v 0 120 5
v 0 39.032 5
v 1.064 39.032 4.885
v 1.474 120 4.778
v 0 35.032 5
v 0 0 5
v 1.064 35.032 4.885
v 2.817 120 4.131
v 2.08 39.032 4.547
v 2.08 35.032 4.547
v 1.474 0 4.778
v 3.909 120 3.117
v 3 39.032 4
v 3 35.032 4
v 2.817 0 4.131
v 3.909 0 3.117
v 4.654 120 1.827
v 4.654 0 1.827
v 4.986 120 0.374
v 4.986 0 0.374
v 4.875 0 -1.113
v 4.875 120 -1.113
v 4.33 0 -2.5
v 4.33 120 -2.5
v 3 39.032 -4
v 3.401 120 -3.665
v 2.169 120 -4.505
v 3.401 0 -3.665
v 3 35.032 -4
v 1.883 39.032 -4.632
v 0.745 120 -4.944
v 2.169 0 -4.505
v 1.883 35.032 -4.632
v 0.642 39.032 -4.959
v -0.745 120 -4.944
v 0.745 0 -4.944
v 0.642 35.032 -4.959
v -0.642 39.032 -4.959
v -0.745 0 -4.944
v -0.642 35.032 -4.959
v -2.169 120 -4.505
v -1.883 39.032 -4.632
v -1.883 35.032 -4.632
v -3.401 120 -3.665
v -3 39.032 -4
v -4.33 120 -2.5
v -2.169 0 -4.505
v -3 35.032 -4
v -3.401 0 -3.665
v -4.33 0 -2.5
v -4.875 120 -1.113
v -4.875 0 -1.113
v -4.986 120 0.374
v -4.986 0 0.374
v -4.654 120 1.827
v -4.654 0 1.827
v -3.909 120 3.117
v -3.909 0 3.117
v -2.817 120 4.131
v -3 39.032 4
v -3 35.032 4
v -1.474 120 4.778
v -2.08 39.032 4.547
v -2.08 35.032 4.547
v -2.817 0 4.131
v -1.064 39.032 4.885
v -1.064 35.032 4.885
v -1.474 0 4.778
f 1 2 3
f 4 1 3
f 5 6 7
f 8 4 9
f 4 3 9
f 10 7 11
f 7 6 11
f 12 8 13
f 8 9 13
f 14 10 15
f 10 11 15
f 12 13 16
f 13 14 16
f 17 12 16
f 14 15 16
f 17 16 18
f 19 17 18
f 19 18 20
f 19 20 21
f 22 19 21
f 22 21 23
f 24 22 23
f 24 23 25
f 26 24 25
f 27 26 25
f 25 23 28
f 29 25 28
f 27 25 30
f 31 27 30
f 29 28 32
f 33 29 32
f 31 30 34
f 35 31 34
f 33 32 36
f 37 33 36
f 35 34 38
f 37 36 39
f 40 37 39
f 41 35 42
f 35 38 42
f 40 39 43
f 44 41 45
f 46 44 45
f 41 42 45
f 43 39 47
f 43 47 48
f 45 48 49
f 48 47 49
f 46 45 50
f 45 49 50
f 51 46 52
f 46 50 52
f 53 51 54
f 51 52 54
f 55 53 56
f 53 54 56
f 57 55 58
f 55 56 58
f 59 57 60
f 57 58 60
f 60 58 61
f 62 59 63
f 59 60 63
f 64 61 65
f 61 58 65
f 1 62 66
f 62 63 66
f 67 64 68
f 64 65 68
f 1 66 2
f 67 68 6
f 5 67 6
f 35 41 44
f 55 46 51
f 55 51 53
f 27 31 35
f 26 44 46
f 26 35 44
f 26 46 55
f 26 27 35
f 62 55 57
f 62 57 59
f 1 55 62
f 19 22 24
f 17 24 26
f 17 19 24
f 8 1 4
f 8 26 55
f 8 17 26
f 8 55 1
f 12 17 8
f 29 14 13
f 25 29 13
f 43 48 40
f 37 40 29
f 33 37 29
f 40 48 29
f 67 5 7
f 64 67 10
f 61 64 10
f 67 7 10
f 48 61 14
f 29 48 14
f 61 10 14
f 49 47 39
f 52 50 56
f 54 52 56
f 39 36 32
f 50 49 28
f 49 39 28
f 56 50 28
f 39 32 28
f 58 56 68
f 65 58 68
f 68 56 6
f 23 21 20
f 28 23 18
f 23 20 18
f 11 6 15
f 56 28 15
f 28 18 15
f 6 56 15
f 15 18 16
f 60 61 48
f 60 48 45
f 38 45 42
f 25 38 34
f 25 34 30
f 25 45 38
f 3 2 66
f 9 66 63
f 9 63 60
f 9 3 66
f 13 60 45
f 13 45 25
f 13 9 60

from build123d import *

# Parameters (mm, degrees)
SKETCH1_R           = 5
BOSS_EXTRUDE1_DEPTH = 120
SKETCH2_W           = 6
SKETCH2_H           = 4
CUT_EXTRUDE1_DEPTH  = 60


with BuildPart() as part:
    # Sketch1 → Boss-Extrude1 (new body)
    with BuildSketch(Plane(origin=(0, 0, 0), x_dir=(1, 0, 0), z_dir=(0, 1, 0))):
        with Locations(Location((0, 0, 0), (0, 0, 270))):
            Circle(SKETCH1_R)
    extrude(amount=BOSS_EXTRUDE1_DEPTH)

    # Sketch2 → Cut-Extrude1 (cut, symmetric)
    with BuildSketch(Plane.XY):
        with Locations((0, 37.032253422)):
            Rectangle(SKETCH2_W, SKETCH2_H)
    extrude(amount=CUT_EXTRUDE1_DEPTH, both=True, mode=Mode.SUBTRACT)


solid = part.part
